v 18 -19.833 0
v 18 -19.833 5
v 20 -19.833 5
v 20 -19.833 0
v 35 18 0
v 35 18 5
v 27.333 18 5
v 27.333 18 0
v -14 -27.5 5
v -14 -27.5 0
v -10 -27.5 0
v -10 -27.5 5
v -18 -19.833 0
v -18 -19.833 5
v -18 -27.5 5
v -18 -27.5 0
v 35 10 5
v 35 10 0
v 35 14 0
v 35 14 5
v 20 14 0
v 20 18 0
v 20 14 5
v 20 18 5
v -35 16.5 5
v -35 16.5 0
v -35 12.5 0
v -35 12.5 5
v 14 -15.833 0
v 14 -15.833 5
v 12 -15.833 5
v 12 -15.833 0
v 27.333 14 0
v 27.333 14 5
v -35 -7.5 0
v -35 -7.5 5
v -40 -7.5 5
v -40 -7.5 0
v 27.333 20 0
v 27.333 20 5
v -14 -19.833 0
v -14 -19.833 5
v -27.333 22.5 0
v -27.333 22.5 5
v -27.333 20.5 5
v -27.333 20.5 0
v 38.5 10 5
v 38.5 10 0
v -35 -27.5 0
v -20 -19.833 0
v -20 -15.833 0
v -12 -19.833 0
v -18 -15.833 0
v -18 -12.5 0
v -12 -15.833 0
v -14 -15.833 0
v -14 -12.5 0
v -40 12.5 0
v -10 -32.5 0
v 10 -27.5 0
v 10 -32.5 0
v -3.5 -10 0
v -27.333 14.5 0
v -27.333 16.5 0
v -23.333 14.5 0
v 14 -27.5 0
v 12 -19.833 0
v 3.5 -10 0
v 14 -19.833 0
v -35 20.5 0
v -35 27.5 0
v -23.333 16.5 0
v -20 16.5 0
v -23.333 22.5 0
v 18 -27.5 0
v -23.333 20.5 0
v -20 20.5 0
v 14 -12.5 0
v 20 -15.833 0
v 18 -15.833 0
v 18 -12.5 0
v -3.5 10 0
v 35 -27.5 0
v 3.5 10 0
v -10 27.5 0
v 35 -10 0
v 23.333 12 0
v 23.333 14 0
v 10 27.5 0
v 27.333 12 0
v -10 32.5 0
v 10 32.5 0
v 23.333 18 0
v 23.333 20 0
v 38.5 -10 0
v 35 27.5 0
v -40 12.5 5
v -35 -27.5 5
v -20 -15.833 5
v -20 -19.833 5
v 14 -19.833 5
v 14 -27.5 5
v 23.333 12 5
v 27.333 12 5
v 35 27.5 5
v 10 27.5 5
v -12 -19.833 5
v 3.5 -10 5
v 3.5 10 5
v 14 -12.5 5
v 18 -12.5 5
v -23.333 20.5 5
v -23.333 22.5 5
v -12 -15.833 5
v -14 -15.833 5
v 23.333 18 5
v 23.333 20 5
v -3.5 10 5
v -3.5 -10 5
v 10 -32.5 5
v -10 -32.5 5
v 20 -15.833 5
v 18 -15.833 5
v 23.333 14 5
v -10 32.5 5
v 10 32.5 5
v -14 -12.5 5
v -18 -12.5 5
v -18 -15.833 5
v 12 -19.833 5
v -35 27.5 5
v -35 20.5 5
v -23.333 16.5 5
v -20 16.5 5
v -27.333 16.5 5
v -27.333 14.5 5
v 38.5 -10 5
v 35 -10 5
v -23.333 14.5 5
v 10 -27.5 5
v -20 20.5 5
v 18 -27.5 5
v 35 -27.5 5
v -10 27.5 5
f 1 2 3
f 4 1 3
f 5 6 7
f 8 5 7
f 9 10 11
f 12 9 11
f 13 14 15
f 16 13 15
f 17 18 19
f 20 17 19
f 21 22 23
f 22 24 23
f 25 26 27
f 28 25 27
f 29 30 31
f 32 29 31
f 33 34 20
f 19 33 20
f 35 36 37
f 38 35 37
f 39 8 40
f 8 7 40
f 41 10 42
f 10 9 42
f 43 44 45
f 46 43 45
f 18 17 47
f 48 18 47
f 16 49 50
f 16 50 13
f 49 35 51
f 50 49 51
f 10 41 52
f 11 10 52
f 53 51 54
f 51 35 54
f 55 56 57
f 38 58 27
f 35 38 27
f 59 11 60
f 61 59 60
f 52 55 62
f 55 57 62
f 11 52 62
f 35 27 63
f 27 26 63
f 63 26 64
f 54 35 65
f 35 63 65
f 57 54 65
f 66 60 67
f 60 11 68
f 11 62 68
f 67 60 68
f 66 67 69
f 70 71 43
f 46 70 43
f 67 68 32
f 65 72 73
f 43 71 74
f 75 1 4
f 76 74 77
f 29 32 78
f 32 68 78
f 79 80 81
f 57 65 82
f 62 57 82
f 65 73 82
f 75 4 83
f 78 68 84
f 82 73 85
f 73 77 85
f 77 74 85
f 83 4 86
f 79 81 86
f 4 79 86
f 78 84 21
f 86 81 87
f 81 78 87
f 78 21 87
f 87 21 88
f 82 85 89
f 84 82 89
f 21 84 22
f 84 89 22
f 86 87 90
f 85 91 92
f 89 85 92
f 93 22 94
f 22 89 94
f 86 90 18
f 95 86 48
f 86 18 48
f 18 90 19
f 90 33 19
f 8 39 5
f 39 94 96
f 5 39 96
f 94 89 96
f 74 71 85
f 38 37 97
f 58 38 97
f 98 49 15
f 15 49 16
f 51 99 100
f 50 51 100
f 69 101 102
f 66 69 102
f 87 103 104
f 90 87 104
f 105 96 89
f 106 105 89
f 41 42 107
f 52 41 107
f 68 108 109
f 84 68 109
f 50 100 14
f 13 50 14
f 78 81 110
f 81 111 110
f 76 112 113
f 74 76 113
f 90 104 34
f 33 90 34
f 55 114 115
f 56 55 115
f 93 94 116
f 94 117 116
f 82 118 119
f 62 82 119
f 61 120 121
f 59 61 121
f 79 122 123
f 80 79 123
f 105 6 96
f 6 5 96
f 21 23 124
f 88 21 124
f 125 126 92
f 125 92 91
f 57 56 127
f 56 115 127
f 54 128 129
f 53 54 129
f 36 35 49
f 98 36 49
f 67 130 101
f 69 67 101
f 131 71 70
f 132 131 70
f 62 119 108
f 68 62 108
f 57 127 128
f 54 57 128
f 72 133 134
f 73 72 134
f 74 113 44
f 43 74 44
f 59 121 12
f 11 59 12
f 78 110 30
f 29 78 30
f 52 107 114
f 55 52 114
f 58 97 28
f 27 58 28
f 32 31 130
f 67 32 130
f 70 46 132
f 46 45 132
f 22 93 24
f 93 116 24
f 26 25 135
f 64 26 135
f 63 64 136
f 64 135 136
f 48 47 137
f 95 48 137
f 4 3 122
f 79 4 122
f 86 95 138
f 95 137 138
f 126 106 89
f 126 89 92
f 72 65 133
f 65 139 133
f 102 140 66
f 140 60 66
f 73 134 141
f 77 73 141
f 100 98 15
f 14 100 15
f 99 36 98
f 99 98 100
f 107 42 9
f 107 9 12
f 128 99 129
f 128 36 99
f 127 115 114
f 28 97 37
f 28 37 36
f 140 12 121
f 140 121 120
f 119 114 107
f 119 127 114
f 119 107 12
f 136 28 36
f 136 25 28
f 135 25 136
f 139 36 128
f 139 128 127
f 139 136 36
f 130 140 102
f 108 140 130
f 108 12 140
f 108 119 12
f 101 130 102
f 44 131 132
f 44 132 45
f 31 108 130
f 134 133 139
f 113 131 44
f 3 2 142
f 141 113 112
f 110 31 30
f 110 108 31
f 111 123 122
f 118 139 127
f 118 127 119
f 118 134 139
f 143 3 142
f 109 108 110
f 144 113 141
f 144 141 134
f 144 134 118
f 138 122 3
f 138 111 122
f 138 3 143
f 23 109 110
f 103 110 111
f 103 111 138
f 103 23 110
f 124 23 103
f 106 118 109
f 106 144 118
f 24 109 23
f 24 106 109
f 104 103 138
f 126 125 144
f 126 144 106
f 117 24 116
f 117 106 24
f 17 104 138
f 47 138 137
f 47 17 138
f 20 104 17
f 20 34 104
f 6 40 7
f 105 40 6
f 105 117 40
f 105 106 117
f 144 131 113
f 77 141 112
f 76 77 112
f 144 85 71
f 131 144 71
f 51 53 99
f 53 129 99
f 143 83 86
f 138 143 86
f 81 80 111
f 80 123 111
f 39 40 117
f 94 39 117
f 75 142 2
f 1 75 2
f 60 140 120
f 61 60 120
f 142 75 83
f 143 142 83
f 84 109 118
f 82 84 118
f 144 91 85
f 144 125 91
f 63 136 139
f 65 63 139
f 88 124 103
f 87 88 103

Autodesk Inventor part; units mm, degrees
ref_plane "YZ Plane" through (0, 0, 0) normal (1, 0, 0) x (0, 1, 0)
ref_plane "XZ Plane" through (0, 0, 0) normal (0, 1, 0) x (-1, 0, 0)
ref_plane "XY Plane" through (0, 0, 0) normal (0, 0, 1) x (1, 0, 0)
sketch "Sketch1" plane through (0, 0, 0) normal (0, 0, 1) x (1, 0, 0)
  line L0 (-35, -27.5) -> (35, -27.5)
  line L1 (35, -27.5) -> (35, 27.5)
  line L2 (35, 27.5) -> (-35, 27.5)
  line L3 (-35, 27.5) -> (-35, -27.5)
  line L4 (-35, -27.5) -> (35, 27.5) construction
  line L5 (35, -27.5) -> (-35, 27.5) construction
  point P0 (0, 0)
  dimension "d0" = 70
  dimension "d1" = 55
extrude "Extrusion1" add sketch "Sketch1" along normal blind 5
sketch "Sketch2" plane through (0, 0, 5) normal (0, 0, 1) x (1, 0, 0)
  line L0 (-35, -27.5) -> (35, -27.5) construction
  line L1 (35, -27.5) -> (35, 27.5) construction
  line L2 (35, 27.5) -> (-35, 27.5) construction
  line L3 (-35, 27.5) -> (-35, -27.5) construction
  line L4 (-10, -27.5) -> (10, -27.5)
  line L5 (10, -27.5) -> (10, -32.5)
  line L6 (10, -32.5) -> (-10, -32.5)
  line L7 (-10, -32.5) -> (-10, -27.5)
  line L8 (-35, -7.5) -> (-40, -7.5)
  line L9 (-40, -7.5) -> (-40, 12.5)
  line L10 (-40, 12.5) -> (-35, 12.5)
  line L11 (-35, 12.5) -> (-35, -7.5)
  line L12 (35, 27.5) -> (-35, 27.5) construction
  line L13 (-10, 27.5) -> (10, 27.5)
  line L14 (10, 27.5) -> (10, 32.5)
  line L15 (10, 32.5) -> (-10, 32.5)
  line L16 (-10, 32.5) -> (-10, 27.5)
  line L17 (35, 18) -> (35, 14) construction
  line L18 (35, 14) -> (20, 14) construction
  line L19 (20, 14) -> (20, 18) construction
  line L20 (20, 18) -> (35, 18) construction
  line L21 (35, 16) -> (20, 16) construction
  line L22 (23.3333, 20) -> (23.3333, 12) construction
  line L23 (23.3333, 12) -> (27.3333, 12) construction
  line L24 (27.3333, 12) -> (27.3333, 20) construction
  line L25 (27.3333, 20) -> (23.3333, 20) construction
  line L26 (23.3333, 20) -> (27.3333, 12) construction
  line L27 (23.3333, 12) -> (27.3333, 20) construction
  line L28 (35, 18) -> (27.3333, 18)
  line L29 (27.3333, 18) -> (27.3333, 20)
  line L30 (27.3333, 20) -> (23.3333, 20)
  line L31 (23.3333, 20) -> (23.3333, 18)
  line L32 (23.3333, 18) -> (20, 18)
  line L33 (20, 18) -> (20, 14)
  line L34 (20, 14) -> (23.3333, 14)
  line L35 (23.3333, 14) -> (23.3333, 12)
  line L36 (23.3333, 12) -> (27.3333, 12)
  line L37 (27.3333, 12) -> (27.3333, 14)
  line L38 (27.3333, 14) -> (35, 14)
  line L39 (35, 14) -> (35, 18)
  line L40 (-35, 16.5) -> (-35, 20.5) construction
  line L41 (-35, 20.5) -> (-20, 20.5) construction
  line L42 (-20, 20.5) -> (-20, 16.5) construction
  line L43 (-20, 16.5) -> (-35, 16.5) construction
  line L44 (-35, 18.5) -> (-20, 18.5) construction
  line L45 (-23.3333, 14.5) -> (-23.3333, 22.5) construction
  line L46 (-23.3333, 22.5) -> (-27.3333, 22.5) construction
  line L47 (-27.3333, 22.5) -> (-27.3333, 14.5) construction
  line L48 (-27.3333, 14.5) -> (-23.3333, 14.5) construction
  line L49 (-23.3333, 14.5) -> (-27.3333, 22.5) construction
  line L50 (-23.3333, 22.5) -> (-27.3333, 14.5) construction
  line L51 (-35, 16.5) -> (-27.3333, 16.5)
  line L52 (-27.3333, 16.5) -> (-27.3333, 14.5)
  line L53 (-27.3333, 14.5) -> (-23.3333, 14.5)
  line L54 (-23.3333, 14.5) -> (-23.3333, 16.5)
  line L55 (-23.3333, 16.5) -> (-20, 16.5)
  line L56 (-20, 16.5) -> (-20, 20.5)
  line L57 (-20, 20.5) -> (-23.3333, 20.5)
  line L58 (-23.3333, 20.5) -> (-23.3333, 22.5)
  line L59 (-23.3333, 22.5) -> (-27.3333, 22.5)
  line L60 (-27.3333, 22.5) -> (-27.3333, 20.5)
  line L61 (-27.3333, 20.5) -> (-35, 20.5)
  line L62 (-35, 20.5) -> (-35, 16.5)
  line L63 (-14, -27.5) -> (-18, -27.5) construction
  line L64 (-18, -27.5) -> (-18, -12.5) construction
  line L65 (-18, -12.5) -> (-14, -12.5) construction
  line L66 (-14, -12.5) -> (-14, -27.5) construction
  line L67 (-16, -27.5) -> (-16, -12.5) construction
  line L68 (-12, -15.8333) -> (-20, -15.8333) construction
  line L69 (-20, -15.8333) -> (-20, -19.8333) construction
  line L70 (-20, -19.8333) -> (-12, -19.8333) construction
  line L71 (-12, -19.8333) -> (-12, -15.8333) construction
  line L72 (-12, -15.8333) -> (-20, -19.8333) construction
  line L73 (-20, -15.8333) -> (-12, -19.8333) construction
  line L74 (-14, -27.5) -> (-14, -19.8333)
  line L75 (-14, -19.8333) -> (-12, -19.8333)
  line L76 (-12, -19.8333) -> (-12, -15.8333)
  line L77 (-12, -15.8333) -> (-14, -15.8333)
  line L78 (-14, -15.8333) -> (-14, -12.5)
  line L79 (-14, -12.5) -> (-18, -12.5)
  line L80 (-18, -12.5) -> (-18, -15.8333)
  line L81 (-18, -15.8333) -> (-20, -15.8333)
  line L82 (-20, -15.8333) -> (-20, -19.8333)
  line L83 (-20, -19.8333) -> (-18, -19.8333)
  line L84 (-18, -19.8333) -> (-18, -27.5)
  line L85 (-18, -27.5) -> (-14, -27.5)
  line L86 (18, -27.5) -> (14, -27.5) construction
  line L87 (14, -27.5) -> (14, -12.5) construction
  line L88 (14, -12.5) -> (18, -12.5) construction
  line L89 (18, -12.5) -> (18, -27.5) construction
  line L90 (16, -27.5) -> (16, -12.5) construction
  line L91 (20, -15.8333) -> (12, -15.8333) construction
  line L92 (12, -15.8333) -> (12, -19.8333) construction
  line L93 (12, -19.8333) -> (20, -19.8333) construction
  line L94 (20, -19.8333) -> (20, -15.8333) construction
  line L95 (20, -15.8333) -> (12, -19.8333) construction
  line L96 (12, -15.8333) -> (20, -19.8333) construction
  line L97 (18, -27.5) -> (18, -19.8333)
  line L98 (18, -19.8333) -> (20, -19.8333)
  line L99 (20, -19.8333) -> (20, -15.8333)
  line L100 (20, -15.8333) -> (18, -15.8333)
  line L101 (18, -15.8333) -> (18, -12.5)
  line L102 (18, -12.5) -> (14, -12.5)
  line L103 (14, -12.5) -> (14, -15.8333)
  line L104 (14, -15.8333) -> (12, -15.8333)
  line L105 (12, -15.8333) -> (12, -19.8333)
  line L106 (12, -19.8333) -> (14, -19.8333)
  line L107 (14, -19.8333) -> (14, -27.5)
  line L108 (14, -27.5) -> (18, -27.5)
  line L109 (35, -27.5) -> (35, 27.5) construction
  line L110 (35, 10) -> (38.5, 10)
  line L111 (38.5, 10) -> (38.5, -10)
  line L112 (38.5, -10) -> (35, -10)
  line L113 (35, -10) -> (35, 10)
  point P0 (0, 0)
  point P1 (25.3333, 16)
  point P2 (-25.3333, 18.5)
  point P3 (-16, -17.8333)
  point P4 (16, -17.8333)
  dimension "d4" = 20
  dimension "d5" = 5
  dimension "d6" = 25
  dimension "d7" = 5
  dimension "d8" = 20
  dimension "d9" = 20
  dimension "d10" = 20
  dimension "d11" = 5
  dimension "d12" = 25
  dimension "d13" = 4
  dimension "d14" = 15
  dimension "d15" = 8
  dimension "d16" = 4
  dimension "d22" = 4
  dimension "d23" = 15
  dimension "d24" = 8
  dimension "d25" = 4
  dimension "d26" = 4
  dimension "d28" = 4
  dimension "d29" = 15
  dimension "d30" = 8
  dimension "d31" = 4
  dimension "d32" = 4
  dimension "d33" = 15
  dimension "d34" = 8
  dimension "d35" = 4
  dimension "d36" = 8
  dimension "d37" = 4
  dimension "d38" = 3.5
  dimension "d39" = 20
  dimension "d40" = 17.5
  dimension "d41" = 4
extrude "Extrusion2" add sketch "Sketch2" against normal blind 5 contours L4 L5 L6 L7 | L8 L9 L10 L11 | L16 L15 L14 L13 | L110 L111 L112 L113
sketch "Sketch3" plane through (0, 0, 5) normal (0, 0, 1) x (1, 0, 0)
  line L0 (-35, -27.5) -> (35, -27.5) construction
  line L1 (35, -27.5) -> (35, 27.5) construction
  line L2 (35, 27.5) -> (-35, 27.5) construction
  line L3 (-35, 27.5) -> (-35, -27.5) construction
  line L4 (-10, -27.5) -> (10, -27.5)
  line L5 (10, -27.5) -> (10, -32.5)
  line L6 (10, -32.5) -> (-10, -32.5)
  line L7 (-10, -32.5) -> (-10, -27.5)
  line L8 (-35, -7.5) -> (-40, -7.5)
  line L9 (-40, -7.5) -> (-40, 12.5)
  line L10 (-40, 12.5) -> (-35, 12.5)
  line L11 (-35, 12.5) -> (-35, -7.5)
  line L12 (35, 27.5) -> (-35, 27.5) construction
  line L13 (-15, 27.5) -> (10, 27.5)
  line L14 (10, 27.5) -> (10, 32.5)
  line L15 (10, 32.5) -> (-15, 32.5)
  line L16 (-15, 32.5) -> (-15, 27.5)
  line L17 (35, 18) -> (35, 14) construction
  line L18 (35, 14) -> (20, 14) construction
  line L19 (20, 14) -> (20, 18) construction
  line L20 (20, 18) -> (35, 18) construction
  line L21 (35, 16) -> (20, 16) construction
  line L22 (23.3333, 20) -> (23.3333, 12) construction
  line L23 (23.3333, 12) -> (27.3333, 12) construction
  line L24 (27.3333, 12) -> (27.3333, 20) construction
  line L25 (27.3333, 20) -> (23.3333, 20) construction
  line L26 (23.3333, 20) -> (27.3333, 12) construction
  line L27 (23.3333, 12) -> (27.3333, 20) construction
  line L28 (35, 18) -> (27.3333, 18)
  line L29 (27.3333, 18) -> (27.3333, 20)
  line L30 (27.3333, 20) -> (23.3333, 20)
  line L31 (23.3333, 20) -> (23.3333, 18)
  line L32 (23.3333, 18) -> (20, 18)
  line L33 (20, 18) -> (20, 14)
  line L34 (20, 14) -> (23.3333, 14)
  line L35 (23.3333, 14) -> (23.3333, 12)
  line L36 (23.3333, 12) -> (27.3333, 12)
  line L37 (27.3333, 12) -> (27.3333, 14)
  line L38 (27.3333, 14) -> (35, 14)
  line L39 (35, 14) -> (35, 18)
  line L40 (-27.3333, 14.5) -> (-23.3333, 14.5) construction
  line L41 (-27.3333, 14.5) -> (-23.3333, 14.5)
  line L42 (-23.3333, 14.5) -> (-23.3333, 16.5)
  line L43 (-27.3333, 22.5) -> (-27.3333, 14.5) construction
  line L44 (-23.3333, 14.5) -> (-23.3333, 22.5) construction
  line L45 (-23.3333, 14.5) -> (-27.3333, 22.5) construction
  line L46 (-23.3333, 22.5) -> (-27.3333, 14.5) construction
  line L47 (-23.3333, 16.5) -> (-20, 16.5)
  line L48 (-35, 16.5) -> (-27.3333, 16.5)
  line L49 (-27.3333, 22.5) -> (-27.3333, 20.5)
  line L50 (-23.3333, 20.5) -> (-23.3333, 22.5)
  line L51 (-23.3333, 22.5) -> (-27.3333, 22.5) construction
  line L52 (-23.3333, 22.5) -> (-27.3333, 22.5)
  line L53 (-35, 16.5) -> (-35, 20.5) construction
  line L54 (-35, 20.5) -> (-35, 16.5)
  line L55 (-27.3333, 20.5) -> (-35, 20.5)
  line L56 (-20, 16.5) -> (-35, 16.5) construction
  line L57 (-35, 18.5) -> (-20, 18.5) construction
  line L58 (-35, 20.5) -> (-20, 20.5) construction
  line L59 (-27.3333, 16.5) -> (-27.3333, 14.5)
  line L60 (-20, 20.5) -> (-20, 16.5) construction
  line L61 (-20, 16.5) -> (-20, 20.5)
  line L62 (-20, 20.5) -> (-23.3333, 20.5)
  line L63 (-14, -27.5) -> (-18, -27.5) construction
  line L64 (-18, -27.5) -> (-18, -12.5) construction
  line L65 (-14, -12.5) -> (-14, -27.5) construction
  line L66 (-16, -27.5) -> (-16, -12.5) construction
  line L67 (-18, -19.8333) -> (-18, -27.5)
  line L68 (-14, -27.5) -> (-14, -19.8333)
  line L69 (-18, -27.5) -> (-14, -27.5)
  line L70 (-20, -19.8333) -> (-12, -19.8333) construction
  line L71 (-20, -19.8333) -> (-18, -19.8333)
  line L72 (-14, -19.8333) -> (-12, -19.8333)
  line L73 (-12, -15.8333) -> (-20, -19.8333) construction
  line L74 (-12, -19.8333) -> (-12, -15.8333) construction
  line L75 (-12, -19.8333) -> (-12, -15.8333)
  line L76 (-20, -15.8333) -> (-12, -19.8333) construction
  line L77 (-12, -15.8333) -> (-14, -15.8333)
  line L78 (-12, -15.8333) -> (-20, -15.8333) construction
  line L79 (-20, -15.8333) -> (-20, -19.8333)
  line L80 (-18, -15.8333) -> (-20, -15.8333)
  line L81 (-14, -15.8333) -> (-14, -12.5)
  line L82 (-18, -12.5) -> (-14, -12.5) construction
  line L83 (-14, -12.5) -> (-18, -12.5)
  line L84 (-18, -12.5) -> (-18, -15.8333)
  line L85 (-20, -15.8333) -> (-20, -19.8333) construction
  line L86 (18, -27.5) -> (14, -27.5) construction
  line L87 (14, -27.5) -> (14, -12.5) construction
  line L88 (18, -12.5) -> (18, -27.5) construction
  line L89 (16, -27.5) -> (16, -12.5) construction
  line L90 (14, -19.8333) -> (14, -27.5)
  line L91 (18, -27.5) -> (18, -19.8333)
  line L92 (14, -27.5) -> (18, -27.5)
  line L93 (12, -19.8333) -> (20, -19.8333) construction
  line L94 (12, -19.8333) -> (14, -19.8333)
  line L95 (18, -19.8333) -> (20, -19.8333)
  line L96 (20, -15.8333) -> (12, -19.8333) construction
  line L97 (20, -19.8333) -> (20, -15.8333) construction
  line L98 (20, -19.8333) -> (20, -15.8333)
  line L99 (12, -15.8333) -> (20, -19.8333) construction
  line L100 (20, -15.8333) -> (18, -15.8333)
  line L101 (20, -15.8333) -> (12, -15.8333) construction
  line L102 (12, -15.8333) -> (12, -19.8333)
  line L103 (14, -15.8333) -> (12, -15.8333)
  line L104 (18, -15.8333) -> (18, -12.5)
  line L105 (14, -12.5) -> (18, -12.5) construction
  line L106 (18, -12.5) -> (14, -12.5)
  line L107 (14, -12.5) -> (14, -15.8333)
  line L108 (12, -15.8333) -> (12, -19.8333) construction
  line L109 (35, -27.5) -> (35, 27.5) construction
  line L110 (35, 10) -> (40, 10)
  line L111 (40, 10) -> (40, -10)
  line L112 (40, -10) -> (35, -10)
  line L113 (35, -10) -> (35, 10)
  point P0 (0, 0)
  point P1 (0, 0)
  point P2 (25.3333, 16)
  point P3 (-25.3333, 18.5)
  point P4 (-16, -17.8333)
  point P5 (16, -17.8333)
  dimension "d44" = 20
  dimension "d45" = 5
  dimension "d46" = 25
  dimension "d47" = 5
  dimension "d48" = 20
  dimension "d49" = 20
  dimension "d50" = 25
  dimension "d51" = 5
  dimension "d52" = 20
  dimension "d53" = 4
  dimension "d54" = 15
  dimension "d55" = 8
  dimension "d56" = 4
  dimension "d57" = 4
  dimension "d58" = 15
  dimension "d59" = 8
  dimension "d60" = 4
  dimension "d61" = 4
  dimension "d62" = 4
  dimension "d63" = 15
  dimension "d64" = 8
  dimension "d65" = 4
  dimension "d66" = 4
  dimension "d67" = 15
  dimension "d68" = 8
  dimension "d69" = 4
  dimension "d70" = 8
  dimension "d71" = 4
  dimension "d72" = 5
  dimension "d73" = 20
  dimension "d74" = 17.5
  dimension "d75" = 4
extrude "Extrusion3" cut sketch "Sketch3" against normal blind 5 contours L39 L38 L37 L36 L35 L34 L33 L32 L31 L30 L29 L28 | L59 L48 L54 L55 L49 L52 L50 L62 L61 L47 L42 L41 | L71 L79 L80 L84 L83 L81 L77 L75 L72 L68 L69 L67 | L94 L102 L103 L107 L106 L104 L100 L98 L95 L91 L92 L90
sketch "Sketch4" plane through (0, 0, 5) normal (0, 0, 1) x (1, 0, 0)
  line L0 (-14, -19.8333) -> (-14, -27.5) construction
  line L1 (-14, -27.5) -> (-10, -27.5) construction
  line L2 (-10, -32.5) -> (-10, -27.5) construction
  line L3 (10, -32.5) -> (-10, -32.5) construction
  line L4 (10, -27.5) -> (10, -32.5) construction
  line L5 (10, -27.5) -> (14, -27.5) construction
  line L6 (14, -27.5) -> (14, -19.8333) construction
  line L7 (14, -19.8333) -> (12, -19.8333) construction
  line L8 (12, -19.8333) -> (12, -15.8333) construction
  line L9 (12, -15.8333) -> (14, -15.8333) construction
  line L10 (14, -15.8333) -> (14, -12.5) construction
  line L11 (14, -12.5) -> (18, -12.5) construction
  line L12 (18, -12.5) -> (18, -15.8333) construction
  line L13 (18, -15.8333) -> (20, -15.8333) construction
  line L14 (20, -15.8333) -> (20, -19.8333) construction
  line L15 (20, -19.8333) -> (18, -19.8333) construction
  line L16 (18, -19.8333) -> (18, -27.5) construction
  line L17 (18, -27.5) -> (35, -27.5) construction
  line L18 (35, -27.5) -> (35, -10) construction
  line L19 (38.5, -10) -> (35, -10) construction
  line L20 (38.5, 10) -> (38.5, -10) construction
  line L21 (35, 10) -> (38.5, 10) construction
  line L22 (35, 10) -> (35, 14) construction
  line L23 (35, 14) -> (27.3333, 14) construction
  line L24 (27.3333, 14) -> (27.3333, 12) construction
  line L25 (27.3333, 12) -> (23.3333, 12) construction
  line L26 (23.3333, 12) -> (23.3333, 14) construction
  line L27 (23.3333, 14) -> (20, 14) construction
  line L28 (20, 14) -> (20, 18) construction
  line L29 (20, 18) -> (23.3333, 18) construction
  line L30 (23.3333, 18) -> (23.3333, 20) construction
  line L31 (23.3333, 20) -> (27.3333, 20) construction
  line L32 (27.3333, 20) -> (27.3333, 18) construction
  line L33 (27.3333, 18) -> (35, 18) construction
  line L34 (35, 18) -> (35, 27.5) construction
  line L35 (35, 27.5) -> (10, 27.5) construction
  line L36 (10, 27.5) -> (10, 32.5) construction
  line L37 (10, 32.5) -> (-10, 32.5) construction
  line L38 (-10, 32.5) -> (-10, 27.5) construction
  line L39 (-10, 27.5) -> (-35, 27.5) construction
  line L40 (-35, 27.5) -> (-35, 20.5) construction
  line L41 (-35, 20.5) -> (-27.3333, 20.5) construction
  line L42 (-27.3333, 20.5) -> (-27.3333, 22.5) construction
  line L43 (-27.3333, 22.5) -> (-23.3333, 22.5) construction
  line L44 (-23.3333, 22.5) -> (-23.3333, 20.5) construction
  line L45 (-23.3333, 20.5) -> (-20, 20.5) construction
  line L46 (-20, 20.5) -> (-20, 16.5) construction
  line L47 (-20, 16.5) -> (-23.3333, 16.5) construction
  line L48 (-23.3333, 16.5) -> (-23.3333, 14.5) construction
  line L49 (-23.3333, 14.5) -> (-27.3333, 14.5) construction
  line L50 (-27.3333, 14.5) -> (-27.3333, 16.5) construction
  line L51 (-27.3333, 16.5) -> (-35, 16.5) construction
  line L52 (-35, 16.5) -> (-35, 12.5) construction
  line L53 (-40, 12.5) -> (-35, 12.5) construction
  line L54 (-40, -7.5) -> (-40, 12.5) construction
  line L55 (-35, -7.5) -> (-40, -7.5) construction
  line L56 (-35, -7.5) -> (-35, -27.5) construction
  line L57 (-35, -27.5) -> (-18, -27.5) construction
  line L58 (-18, -27.5) -> (-18, -19.8333) construction
  line L59 (-18, -19.8333) -> (-20, -19.8333) construction
  line L60 (-20, -19.8333) -> (-20, -15.8333) construction
  line L61 (-20, -15.8333) -> (-18, -15.8333) construction
  line L62 (-18, -15.8333) -> (-18, -12.5) construction
  line L63 (-18, -12.5) -> (-14, -12.5) construction
  line L64 (-14, -12.5) -> (-14, -15.8333) construction
  line L65 (-14, -15.8333) -> (-12, -15.8333) construction
  line L66 (-12, -15.8333) -> (-12, -19.8333) construction
  line L67 (-12, -19.8333) -> (-14, -19.8333) construction
  line L68 (0, 32.5) -> (0, -32.5) construction
  line L69 (-40, 0) -> (38.5, 0) construction
  line L70 (-3.5, -10) -> (3.5, -10)
  line L71 (3.5, -10) -> (3.5, 10)
  line L72 (3.5, 10) -> (-3.5, 10)
  line L73 (-3.5, 10) -> (-3.5, -10)
  line L74 (-3.5, -10) -> (3.5, 10) construction
  line L75 (3.5, -10) -> (-3.5, 10) construction
  point P0 (0, 0)
  dimension "d80" = 7
  dimension "d81" = 20
extrude "Extrusion4" cut sketch "Sketch4" against normal blind 10
properties part number "Refuerzo_Conducto"
